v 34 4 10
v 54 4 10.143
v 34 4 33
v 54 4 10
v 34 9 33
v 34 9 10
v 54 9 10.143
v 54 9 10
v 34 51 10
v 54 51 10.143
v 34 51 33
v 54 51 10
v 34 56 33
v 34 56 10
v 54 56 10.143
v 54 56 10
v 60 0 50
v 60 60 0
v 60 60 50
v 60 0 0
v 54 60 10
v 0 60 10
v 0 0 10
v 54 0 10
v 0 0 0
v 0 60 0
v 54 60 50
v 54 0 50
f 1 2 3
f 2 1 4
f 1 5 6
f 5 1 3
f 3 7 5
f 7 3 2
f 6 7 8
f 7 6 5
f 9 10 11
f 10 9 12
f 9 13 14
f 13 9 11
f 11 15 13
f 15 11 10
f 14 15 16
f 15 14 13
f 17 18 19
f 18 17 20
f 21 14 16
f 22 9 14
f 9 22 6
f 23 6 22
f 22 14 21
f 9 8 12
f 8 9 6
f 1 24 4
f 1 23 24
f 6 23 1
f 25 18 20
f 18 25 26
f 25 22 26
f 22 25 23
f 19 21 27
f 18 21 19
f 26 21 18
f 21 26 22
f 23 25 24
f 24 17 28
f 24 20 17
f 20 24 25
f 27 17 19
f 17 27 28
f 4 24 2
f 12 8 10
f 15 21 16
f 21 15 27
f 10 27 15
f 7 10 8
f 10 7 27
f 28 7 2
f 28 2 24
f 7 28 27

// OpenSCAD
$fn = 32;

// ----------------------------------------------------------------------
// Rib bracket: 2-gusset L bracket
// ----------------------------------------------------------------------

// --- parameters (mm) ---
base_l = 60;              // foot length, X
base_w = 60;              // foot width, Y
base_t = 10;              // foot thickness
plate_t = 6;              // upright plate thickness
plate_h = 50;             // overall height
gus_l = 20;               // gusset leg along the foot
gus_h = 24;               // gusset height
gus_t = 5;                // gusset thickness
gus_edge = 4;             // gusset margin from the foot edge
n_gus = 2;                // gusset count

gus_pitch = (base_w - 2 * gus_edge - gus_t) / (n_gus - 1);  // gusset pitch

union() {
  cube([base_l, base_w, base_t]);
  translate([base_l - plate_t, 0, base_t - 1])
    cube([plate_t, base_w, plate_h - base_t + 1]);
  for (i = [0 : n_gus - 1])
    translate([base_l - plate_t - gus_l, gus_edge + i * gus_pitch, base_t - 1])
      rotate([-90, 0, 0])
        linear_extrude(height = gus_t)
          polygon(points = [[0, 0], [gus_l + 1, 0], [0, -gus_h]]);
}
